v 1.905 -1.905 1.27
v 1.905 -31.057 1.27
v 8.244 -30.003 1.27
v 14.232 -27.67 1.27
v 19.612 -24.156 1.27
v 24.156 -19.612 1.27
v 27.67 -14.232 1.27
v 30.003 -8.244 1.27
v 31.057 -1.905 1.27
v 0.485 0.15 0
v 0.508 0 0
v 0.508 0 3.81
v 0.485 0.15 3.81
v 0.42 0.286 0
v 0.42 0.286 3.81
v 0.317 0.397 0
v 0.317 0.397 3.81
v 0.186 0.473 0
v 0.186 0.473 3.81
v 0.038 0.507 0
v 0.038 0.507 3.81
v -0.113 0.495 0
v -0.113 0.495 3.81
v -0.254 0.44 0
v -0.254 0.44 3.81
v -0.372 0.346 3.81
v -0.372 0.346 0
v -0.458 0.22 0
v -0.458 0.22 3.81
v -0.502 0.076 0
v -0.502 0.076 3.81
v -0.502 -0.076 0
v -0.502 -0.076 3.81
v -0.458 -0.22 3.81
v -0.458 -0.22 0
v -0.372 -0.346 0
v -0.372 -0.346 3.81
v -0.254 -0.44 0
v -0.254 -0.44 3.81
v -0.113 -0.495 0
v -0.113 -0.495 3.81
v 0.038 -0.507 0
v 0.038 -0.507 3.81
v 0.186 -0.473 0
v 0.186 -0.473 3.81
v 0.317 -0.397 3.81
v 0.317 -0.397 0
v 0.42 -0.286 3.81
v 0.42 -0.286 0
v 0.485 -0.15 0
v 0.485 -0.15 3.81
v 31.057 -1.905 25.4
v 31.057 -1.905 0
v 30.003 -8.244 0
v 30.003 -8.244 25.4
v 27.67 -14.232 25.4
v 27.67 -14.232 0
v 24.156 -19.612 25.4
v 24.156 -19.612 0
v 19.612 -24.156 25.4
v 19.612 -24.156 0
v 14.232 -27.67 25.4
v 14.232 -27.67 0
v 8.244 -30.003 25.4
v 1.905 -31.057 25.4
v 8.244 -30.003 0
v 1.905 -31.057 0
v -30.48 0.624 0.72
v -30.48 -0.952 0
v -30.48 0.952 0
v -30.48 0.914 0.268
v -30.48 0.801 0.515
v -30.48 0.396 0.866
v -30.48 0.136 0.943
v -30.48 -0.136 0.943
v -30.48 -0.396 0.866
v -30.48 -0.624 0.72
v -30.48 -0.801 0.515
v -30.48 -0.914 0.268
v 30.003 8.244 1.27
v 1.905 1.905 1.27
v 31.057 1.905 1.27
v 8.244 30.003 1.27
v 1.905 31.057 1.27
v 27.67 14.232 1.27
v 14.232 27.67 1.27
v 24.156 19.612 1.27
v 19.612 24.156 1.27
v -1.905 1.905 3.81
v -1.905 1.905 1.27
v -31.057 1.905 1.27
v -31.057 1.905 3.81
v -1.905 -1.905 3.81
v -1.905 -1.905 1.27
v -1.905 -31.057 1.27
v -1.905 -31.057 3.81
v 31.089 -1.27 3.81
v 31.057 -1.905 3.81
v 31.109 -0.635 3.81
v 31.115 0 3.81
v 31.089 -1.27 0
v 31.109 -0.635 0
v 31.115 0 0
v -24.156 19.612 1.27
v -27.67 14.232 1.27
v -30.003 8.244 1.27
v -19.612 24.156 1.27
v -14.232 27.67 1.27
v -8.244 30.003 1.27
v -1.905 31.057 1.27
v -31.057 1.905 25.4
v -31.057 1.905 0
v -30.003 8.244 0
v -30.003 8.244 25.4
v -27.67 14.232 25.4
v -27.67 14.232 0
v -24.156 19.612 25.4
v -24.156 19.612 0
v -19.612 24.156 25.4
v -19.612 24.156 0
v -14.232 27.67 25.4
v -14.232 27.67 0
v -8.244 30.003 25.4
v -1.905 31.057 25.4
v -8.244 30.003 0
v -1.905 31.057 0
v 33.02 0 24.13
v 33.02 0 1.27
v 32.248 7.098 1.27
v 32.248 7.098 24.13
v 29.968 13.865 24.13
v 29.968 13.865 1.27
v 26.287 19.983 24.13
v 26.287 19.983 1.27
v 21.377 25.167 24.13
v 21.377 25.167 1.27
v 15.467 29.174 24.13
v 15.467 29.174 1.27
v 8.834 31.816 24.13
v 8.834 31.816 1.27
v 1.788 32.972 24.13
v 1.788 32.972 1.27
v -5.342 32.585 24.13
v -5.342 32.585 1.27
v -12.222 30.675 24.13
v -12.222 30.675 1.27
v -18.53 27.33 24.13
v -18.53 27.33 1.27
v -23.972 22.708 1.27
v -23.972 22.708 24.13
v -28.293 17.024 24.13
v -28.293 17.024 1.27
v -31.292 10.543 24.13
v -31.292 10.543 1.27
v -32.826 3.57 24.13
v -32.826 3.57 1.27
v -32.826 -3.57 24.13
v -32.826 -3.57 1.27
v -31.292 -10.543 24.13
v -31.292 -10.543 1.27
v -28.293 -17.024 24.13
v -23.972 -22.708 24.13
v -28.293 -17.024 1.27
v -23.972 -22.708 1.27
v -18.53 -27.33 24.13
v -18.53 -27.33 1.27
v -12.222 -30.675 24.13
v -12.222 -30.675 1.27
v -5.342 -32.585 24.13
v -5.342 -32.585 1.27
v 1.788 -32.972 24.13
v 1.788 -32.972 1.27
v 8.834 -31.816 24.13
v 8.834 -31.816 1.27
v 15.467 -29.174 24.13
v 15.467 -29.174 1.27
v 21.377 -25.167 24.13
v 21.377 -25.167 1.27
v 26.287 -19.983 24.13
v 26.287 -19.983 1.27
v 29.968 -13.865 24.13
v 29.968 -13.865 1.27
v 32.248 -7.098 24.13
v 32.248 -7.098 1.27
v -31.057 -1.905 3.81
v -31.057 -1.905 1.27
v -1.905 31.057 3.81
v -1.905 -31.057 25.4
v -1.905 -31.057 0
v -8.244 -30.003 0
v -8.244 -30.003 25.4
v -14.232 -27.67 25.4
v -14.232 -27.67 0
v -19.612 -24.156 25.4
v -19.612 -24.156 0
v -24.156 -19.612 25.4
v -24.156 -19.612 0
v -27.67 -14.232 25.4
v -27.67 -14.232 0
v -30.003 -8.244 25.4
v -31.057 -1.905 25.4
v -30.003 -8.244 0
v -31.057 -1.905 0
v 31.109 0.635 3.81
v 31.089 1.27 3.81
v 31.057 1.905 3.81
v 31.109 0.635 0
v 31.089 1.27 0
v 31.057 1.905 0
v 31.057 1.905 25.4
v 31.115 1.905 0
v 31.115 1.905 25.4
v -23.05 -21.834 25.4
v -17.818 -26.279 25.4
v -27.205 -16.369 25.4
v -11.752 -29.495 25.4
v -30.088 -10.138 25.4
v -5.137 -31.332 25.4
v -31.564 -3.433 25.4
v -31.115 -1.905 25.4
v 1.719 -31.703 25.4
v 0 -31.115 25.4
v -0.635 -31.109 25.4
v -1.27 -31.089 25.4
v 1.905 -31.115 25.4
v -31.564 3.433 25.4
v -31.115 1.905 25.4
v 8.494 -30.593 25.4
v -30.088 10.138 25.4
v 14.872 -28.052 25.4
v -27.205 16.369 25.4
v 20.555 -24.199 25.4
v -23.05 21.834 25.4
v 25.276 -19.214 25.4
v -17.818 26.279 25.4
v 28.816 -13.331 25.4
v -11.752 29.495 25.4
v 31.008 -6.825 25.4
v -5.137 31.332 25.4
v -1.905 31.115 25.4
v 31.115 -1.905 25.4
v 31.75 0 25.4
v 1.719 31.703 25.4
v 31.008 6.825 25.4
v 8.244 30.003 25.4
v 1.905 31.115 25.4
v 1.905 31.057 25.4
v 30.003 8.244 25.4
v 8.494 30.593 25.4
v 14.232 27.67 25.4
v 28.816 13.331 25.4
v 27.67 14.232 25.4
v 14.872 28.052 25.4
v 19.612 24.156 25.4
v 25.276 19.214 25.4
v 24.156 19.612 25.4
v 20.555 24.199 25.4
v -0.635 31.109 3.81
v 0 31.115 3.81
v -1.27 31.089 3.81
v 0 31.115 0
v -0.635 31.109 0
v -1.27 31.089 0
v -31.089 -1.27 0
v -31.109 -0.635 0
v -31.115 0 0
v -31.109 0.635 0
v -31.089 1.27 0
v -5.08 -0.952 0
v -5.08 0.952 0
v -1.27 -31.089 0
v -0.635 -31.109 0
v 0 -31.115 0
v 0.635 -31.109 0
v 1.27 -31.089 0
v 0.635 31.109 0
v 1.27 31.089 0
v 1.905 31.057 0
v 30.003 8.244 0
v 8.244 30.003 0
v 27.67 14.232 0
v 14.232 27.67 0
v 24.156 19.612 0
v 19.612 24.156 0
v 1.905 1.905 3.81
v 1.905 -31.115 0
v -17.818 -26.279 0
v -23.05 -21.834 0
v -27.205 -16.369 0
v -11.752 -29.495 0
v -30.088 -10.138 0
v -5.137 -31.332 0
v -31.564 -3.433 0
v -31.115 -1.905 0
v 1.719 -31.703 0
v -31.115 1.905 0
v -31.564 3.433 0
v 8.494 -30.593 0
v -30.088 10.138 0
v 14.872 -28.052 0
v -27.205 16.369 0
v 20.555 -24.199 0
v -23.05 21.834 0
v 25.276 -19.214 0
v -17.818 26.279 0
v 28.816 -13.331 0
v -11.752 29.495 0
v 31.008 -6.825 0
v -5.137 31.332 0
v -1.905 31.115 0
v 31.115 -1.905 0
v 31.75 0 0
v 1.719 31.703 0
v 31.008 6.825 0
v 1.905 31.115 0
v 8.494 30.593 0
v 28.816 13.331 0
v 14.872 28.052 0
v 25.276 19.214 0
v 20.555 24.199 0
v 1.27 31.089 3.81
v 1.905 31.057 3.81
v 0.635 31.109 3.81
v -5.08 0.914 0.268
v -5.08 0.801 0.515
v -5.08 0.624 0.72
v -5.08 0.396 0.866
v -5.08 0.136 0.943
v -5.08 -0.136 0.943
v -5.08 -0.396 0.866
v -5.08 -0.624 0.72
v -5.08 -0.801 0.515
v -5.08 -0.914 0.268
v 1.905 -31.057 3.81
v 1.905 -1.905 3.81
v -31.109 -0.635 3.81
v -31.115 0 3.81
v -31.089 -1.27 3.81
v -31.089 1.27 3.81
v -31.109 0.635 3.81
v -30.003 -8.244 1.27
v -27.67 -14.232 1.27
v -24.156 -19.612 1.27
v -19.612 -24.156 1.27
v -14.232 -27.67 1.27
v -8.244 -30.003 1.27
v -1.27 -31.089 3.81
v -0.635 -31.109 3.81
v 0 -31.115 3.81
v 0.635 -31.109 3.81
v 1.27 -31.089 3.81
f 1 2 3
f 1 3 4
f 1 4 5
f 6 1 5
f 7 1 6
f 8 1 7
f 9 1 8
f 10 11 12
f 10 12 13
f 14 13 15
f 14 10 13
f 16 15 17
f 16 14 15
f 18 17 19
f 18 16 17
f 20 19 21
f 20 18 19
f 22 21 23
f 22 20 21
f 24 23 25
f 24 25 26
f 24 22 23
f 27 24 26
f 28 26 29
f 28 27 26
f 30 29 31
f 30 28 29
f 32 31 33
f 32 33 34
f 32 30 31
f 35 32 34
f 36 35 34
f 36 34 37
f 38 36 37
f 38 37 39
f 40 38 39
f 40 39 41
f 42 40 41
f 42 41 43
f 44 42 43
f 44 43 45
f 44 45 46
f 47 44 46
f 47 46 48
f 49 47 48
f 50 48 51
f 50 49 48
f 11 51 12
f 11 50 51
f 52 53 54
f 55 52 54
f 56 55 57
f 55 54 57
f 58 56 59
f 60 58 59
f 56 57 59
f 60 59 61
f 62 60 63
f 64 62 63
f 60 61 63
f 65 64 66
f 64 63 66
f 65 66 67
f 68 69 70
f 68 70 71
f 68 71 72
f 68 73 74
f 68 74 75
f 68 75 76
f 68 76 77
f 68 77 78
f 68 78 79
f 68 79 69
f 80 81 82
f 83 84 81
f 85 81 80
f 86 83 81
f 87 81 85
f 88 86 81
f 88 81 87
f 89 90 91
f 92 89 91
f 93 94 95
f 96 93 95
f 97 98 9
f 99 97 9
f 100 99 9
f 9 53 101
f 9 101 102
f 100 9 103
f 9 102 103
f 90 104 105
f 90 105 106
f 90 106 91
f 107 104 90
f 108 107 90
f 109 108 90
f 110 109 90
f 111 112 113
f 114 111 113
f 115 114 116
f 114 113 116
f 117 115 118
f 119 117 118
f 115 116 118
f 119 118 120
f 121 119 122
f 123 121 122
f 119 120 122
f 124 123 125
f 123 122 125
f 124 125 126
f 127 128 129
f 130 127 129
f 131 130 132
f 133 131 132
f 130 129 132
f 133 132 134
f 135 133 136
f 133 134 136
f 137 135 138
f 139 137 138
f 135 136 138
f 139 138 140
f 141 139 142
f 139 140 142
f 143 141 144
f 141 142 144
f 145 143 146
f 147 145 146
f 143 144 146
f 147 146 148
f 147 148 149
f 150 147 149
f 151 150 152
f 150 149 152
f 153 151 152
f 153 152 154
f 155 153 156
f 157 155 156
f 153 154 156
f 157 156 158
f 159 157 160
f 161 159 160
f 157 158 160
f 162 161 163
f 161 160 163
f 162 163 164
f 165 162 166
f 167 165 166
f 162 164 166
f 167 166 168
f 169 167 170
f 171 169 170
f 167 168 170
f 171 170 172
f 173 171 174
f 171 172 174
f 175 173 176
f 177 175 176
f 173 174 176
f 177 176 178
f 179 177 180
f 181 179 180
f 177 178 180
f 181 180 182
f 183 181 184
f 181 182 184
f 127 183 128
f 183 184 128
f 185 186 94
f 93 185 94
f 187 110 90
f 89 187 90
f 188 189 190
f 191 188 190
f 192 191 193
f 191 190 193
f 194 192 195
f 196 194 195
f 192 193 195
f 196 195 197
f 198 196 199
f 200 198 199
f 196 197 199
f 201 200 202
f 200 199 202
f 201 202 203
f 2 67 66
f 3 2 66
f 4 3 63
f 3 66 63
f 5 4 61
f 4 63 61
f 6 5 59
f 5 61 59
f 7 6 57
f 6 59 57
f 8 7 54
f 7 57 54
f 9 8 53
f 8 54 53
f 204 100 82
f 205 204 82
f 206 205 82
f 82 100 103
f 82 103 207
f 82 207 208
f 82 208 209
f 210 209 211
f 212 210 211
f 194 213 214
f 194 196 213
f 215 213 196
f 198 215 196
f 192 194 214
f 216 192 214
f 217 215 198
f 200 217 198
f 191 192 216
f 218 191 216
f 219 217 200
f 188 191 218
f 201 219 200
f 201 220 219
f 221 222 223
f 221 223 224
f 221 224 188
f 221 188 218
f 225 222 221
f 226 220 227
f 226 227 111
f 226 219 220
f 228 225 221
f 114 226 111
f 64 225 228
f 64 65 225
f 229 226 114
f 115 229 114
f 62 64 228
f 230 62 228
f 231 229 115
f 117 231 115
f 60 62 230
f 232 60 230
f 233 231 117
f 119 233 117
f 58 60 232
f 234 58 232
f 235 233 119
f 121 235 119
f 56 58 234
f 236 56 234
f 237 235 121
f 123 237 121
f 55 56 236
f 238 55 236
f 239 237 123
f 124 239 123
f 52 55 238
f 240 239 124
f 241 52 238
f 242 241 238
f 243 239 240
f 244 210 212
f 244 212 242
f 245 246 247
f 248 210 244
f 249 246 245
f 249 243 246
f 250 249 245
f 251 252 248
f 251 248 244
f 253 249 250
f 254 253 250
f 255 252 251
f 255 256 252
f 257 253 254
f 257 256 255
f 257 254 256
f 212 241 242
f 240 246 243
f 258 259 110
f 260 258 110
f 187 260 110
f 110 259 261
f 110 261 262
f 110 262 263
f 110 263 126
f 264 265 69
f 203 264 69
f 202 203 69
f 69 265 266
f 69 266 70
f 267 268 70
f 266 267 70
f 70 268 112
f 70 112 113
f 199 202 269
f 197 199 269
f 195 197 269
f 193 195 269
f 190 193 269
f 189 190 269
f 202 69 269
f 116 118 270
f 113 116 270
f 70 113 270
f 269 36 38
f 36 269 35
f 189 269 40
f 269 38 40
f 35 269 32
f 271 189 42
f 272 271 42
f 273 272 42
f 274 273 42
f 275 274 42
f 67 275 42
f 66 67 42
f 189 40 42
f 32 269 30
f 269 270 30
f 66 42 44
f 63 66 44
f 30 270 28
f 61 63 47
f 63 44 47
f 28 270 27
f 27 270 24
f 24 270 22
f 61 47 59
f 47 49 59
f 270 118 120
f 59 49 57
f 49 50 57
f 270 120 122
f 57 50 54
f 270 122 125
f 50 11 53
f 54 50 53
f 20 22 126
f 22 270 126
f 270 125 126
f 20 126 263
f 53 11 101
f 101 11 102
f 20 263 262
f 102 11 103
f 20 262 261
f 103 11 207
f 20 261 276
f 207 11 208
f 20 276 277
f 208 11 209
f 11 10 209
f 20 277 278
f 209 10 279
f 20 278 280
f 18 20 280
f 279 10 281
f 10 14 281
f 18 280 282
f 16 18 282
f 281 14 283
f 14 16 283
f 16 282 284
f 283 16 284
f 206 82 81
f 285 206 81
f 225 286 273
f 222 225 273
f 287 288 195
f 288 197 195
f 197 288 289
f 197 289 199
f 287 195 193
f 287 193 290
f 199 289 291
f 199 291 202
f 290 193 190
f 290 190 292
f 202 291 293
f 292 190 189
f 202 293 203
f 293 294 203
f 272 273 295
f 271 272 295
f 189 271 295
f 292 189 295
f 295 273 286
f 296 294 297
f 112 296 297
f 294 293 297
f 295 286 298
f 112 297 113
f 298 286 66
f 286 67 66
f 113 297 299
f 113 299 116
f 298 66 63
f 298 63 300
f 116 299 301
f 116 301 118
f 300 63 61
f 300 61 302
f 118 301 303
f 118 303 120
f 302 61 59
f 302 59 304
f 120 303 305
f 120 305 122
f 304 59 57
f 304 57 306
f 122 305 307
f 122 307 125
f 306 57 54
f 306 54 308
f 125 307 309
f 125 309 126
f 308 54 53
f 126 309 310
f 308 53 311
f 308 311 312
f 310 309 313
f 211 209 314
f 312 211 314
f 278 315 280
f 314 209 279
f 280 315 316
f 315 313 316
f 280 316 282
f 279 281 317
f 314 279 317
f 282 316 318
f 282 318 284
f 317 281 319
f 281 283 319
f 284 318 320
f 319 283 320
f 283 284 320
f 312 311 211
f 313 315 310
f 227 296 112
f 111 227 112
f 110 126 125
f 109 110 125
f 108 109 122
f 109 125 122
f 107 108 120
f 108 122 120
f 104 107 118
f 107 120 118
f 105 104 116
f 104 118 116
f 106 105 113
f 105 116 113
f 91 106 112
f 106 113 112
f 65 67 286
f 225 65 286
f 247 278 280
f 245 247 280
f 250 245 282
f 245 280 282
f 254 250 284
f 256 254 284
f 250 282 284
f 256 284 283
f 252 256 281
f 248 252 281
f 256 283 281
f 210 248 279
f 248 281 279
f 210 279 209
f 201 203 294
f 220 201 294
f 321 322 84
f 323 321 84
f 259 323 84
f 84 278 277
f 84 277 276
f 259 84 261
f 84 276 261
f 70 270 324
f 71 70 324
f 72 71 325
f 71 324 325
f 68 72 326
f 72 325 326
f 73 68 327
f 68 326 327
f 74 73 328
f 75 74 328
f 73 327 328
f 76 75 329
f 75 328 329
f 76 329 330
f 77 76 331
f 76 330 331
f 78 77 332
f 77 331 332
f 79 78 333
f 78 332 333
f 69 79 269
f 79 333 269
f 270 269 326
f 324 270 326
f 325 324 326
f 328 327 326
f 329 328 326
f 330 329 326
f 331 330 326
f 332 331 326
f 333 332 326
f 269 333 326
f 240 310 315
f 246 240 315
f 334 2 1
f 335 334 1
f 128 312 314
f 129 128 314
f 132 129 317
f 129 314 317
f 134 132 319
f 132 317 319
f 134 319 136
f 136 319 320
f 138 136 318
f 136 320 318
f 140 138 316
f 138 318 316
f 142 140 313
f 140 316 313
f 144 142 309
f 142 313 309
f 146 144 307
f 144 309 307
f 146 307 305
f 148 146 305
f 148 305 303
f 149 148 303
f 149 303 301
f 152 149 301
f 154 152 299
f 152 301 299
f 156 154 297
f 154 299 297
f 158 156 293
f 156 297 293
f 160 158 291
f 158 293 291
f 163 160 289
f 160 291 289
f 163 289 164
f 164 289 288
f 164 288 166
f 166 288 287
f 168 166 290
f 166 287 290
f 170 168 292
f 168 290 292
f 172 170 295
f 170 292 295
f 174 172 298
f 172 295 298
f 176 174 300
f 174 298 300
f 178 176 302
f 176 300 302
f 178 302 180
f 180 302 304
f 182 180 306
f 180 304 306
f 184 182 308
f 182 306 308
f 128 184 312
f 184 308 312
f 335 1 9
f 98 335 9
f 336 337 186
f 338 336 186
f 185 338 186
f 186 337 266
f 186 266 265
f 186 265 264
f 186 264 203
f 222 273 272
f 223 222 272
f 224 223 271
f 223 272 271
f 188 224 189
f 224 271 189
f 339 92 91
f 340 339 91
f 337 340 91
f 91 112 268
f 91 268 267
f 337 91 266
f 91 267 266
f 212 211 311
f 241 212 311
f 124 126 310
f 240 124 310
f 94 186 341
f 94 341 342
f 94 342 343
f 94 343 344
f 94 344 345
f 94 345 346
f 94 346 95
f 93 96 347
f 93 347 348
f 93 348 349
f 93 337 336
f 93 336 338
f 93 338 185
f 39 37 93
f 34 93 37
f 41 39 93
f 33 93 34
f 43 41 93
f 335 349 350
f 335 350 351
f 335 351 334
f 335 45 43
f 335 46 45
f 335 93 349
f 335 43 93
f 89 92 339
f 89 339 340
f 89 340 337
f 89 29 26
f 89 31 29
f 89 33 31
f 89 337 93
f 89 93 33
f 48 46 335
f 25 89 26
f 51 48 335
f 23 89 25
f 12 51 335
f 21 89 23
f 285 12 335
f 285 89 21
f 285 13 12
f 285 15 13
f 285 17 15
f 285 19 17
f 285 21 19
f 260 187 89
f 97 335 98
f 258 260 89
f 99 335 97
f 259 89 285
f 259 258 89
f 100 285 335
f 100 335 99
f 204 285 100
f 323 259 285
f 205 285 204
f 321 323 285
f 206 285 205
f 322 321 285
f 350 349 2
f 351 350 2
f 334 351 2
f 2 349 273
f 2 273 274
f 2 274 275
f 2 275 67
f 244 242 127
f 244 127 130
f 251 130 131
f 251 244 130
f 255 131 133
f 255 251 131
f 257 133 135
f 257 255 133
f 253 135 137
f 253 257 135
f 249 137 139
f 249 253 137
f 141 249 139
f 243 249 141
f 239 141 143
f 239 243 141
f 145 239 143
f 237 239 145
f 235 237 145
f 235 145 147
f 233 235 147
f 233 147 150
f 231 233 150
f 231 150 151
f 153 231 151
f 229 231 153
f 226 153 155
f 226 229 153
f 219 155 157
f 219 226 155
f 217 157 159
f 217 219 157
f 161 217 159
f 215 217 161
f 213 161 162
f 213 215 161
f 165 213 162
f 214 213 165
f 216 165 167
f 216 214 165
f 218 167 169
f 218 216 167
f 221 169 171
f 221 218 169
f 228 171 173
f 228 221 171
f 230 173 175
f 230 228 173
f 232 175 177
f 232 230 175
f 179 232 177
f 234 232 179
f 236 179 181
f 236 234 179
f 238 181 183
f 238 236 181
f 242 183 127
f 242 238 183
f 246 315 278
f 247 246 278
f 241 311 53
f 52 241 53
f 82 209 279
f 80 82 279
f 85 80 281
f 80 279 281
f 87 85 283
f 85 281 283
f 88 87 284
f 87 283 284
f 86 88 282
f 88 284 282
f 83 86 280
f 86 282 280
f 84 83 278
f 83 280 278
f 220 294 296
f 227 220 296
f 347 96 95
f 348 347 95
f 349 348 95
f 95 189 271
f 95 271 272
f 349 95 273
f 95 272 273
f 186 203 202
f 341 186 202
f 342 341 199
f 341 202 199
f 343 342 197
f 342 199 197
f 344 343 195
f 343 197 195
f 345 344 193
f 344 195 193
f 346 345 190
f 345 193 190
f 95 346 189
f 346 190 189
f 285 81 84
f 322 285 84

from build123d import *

# Parameters (mm, degrees)
F0_W     = 3.81
F0_H     = 3.81
F0_R     = 0.508
F1_DEPTH = 3.81
F2_DEPTH = 1.27
F4_R     = 0.9525
F5_DEPTH = 25.4
F0_R_2   = 33.02
F6_DEPTH = 25.4
F7_SIZE  = 1.27


# Not quite as in the source:
# - a feature names something its author has since deleted; it is built from what else it names


with BuildPart() as f1:
    # F0 (on Top) → F1 (new body)
    with BuildSketch(Plane.XY):
        Rectangle(F0_W, F0_H)
        Circle(F0_R, mode=Mode.SUBTRACT)
        with BuildLine():
            ThreePointArc((31.056628922, -1.905), (31.1004038069, -0.9529470319), (31.115, 0))
            ThreePointArc((31.115, 0), (31.1004038069, 0.9529470319), (31.056628922, 1.905))
            Line((31.056628922, 1.905), (1.905, 1.905))
            Line((1.905, 1.905), (1.905, -1.905))
            Line((1.905, -1.905), (31.056628922, -1.905))
        make_face()
        with BuildLine():
            ThreePointArc((0, -31.115), (0.9529470319, -31.1004038069), (1.905, -31.056628922))
            Line((1.905, -31.056628922), (1.905, -1.905))
            Line((1.905, -1.905), (-1.905, -1.905))
            Line((-1.905, -1.905), (-1.905, -31.056628922))
            ThreePointArc((-1.905, -31.056628922), (-0.9529470319, -31.1004038069), (0, -31.115))
        make_face()
        with BuildLine():
            Line((-1.905, -1.905), (-1.905, 1.905))
            Line((-1.905, 1.905), (-31.056628922, 1.905))
            ThreePointArc((-31.056628922, 1.905), (-31.1004038069, 0.9529470319), (-31.115, 0))
            ThreePointArc((-31.115, 0), (-31.1004038069, -0.9529470319), (-31.056628922, -1.905))
            Line((-31.056628922, -1.905), (-1.905, -1.905))
        make_face()
        with BuildLine():
            Line((1.905, 1.905), (1.905, 31.056628922))
            ThreePointArc((1.905, 31.056628922), (0.9529470319, 31.1004038069), (0, 31.115))
            ThreePointArc((0, 31.115), (-0.9529470319, 31.1004038069), (-1.905, 31.056628922))
            Line((-1.905, 31.056628922), (-1.905, 1.905))
            Line((-1.905, 1.905), (1.905, 1.905))
        make_face()
    extrude(amount=F1_DEPTH)

    # F0 (on Top) → F2 (join)
    with BuildSketch(Plane.XY):
        with BuildLine():
            Line((1.905, 1.905), (1.905, 31.056628922))
            ThreePointArc((1.905, 31.056628922), (0.9529470319, 31.1004038069), (0, 31.115))
            ThreePointArc((0, 31.115), (-0.9529470319, 31.1004038069), (-1.905, 31.056628922))
            Line((-1.905, 31.056628922), (-1.905, 1.905))
            Line((-1.905, 1.905), (1.905, 1.905))
        make_face()
        with BuildLine():
            ThreePointArc((0, -31.115), (0.9529470319, -31.1004038069), (1.905, -31.056628922))
            Line((1.905, -31.056628922), (1.905, -1.905))
            Line((1.905, -1.905), (-1.905, -1.905))
            Line((-1.905, -1.905), (-1.905, -31.056628922))
            ThreePointArc((-1.905, -31.056628922), (-0.9529470319, -31.1004038069), (0, -31.115))
        make_face()
        with BuildLine():
            Line((-31.056628922, 1.905), (-1.905, 1.905))
            Line((-1.905, 1.905), (-1.905, 31.056628922))
            ThreePointArc((-1.905, 31.056628922), (-22.0016274966, 22.0016274966), (-31.056628922, 1.905))
        make_face()
        with BuildLine():
            Line((-1.905, -31.056628922), (-1.905, -1.905))
            Line((-1.905, -1.905), (-31.056628922, -1.905))
            ThreePointArc((-31.056628922, -1.905), (-22.0016274966, -22.0016274966), (-1.905, -31.056628922))
        make_face()
        with BuildLine():
            Line((1.905, 1.905), (31.056628922, 1.905))
            ThreePointArc((31.056628922, 1.905), (22.0016274966, 22.0016274966), (1.905, 31.056628922))
            Line((1.905, 31.056628922), (1.905, 1.905))
        make_face()
        with BuildLine():
            ThreePointArc((1.905, -31.056628922), (22.0016274966, -22.0016274966), (31.056628922, -1.905))
            Line((31.056628922, -1.905), (1.905, -1.905))
            Line((1.905, -1.905), (1.905, -31.056628922))
        make_face()
    extrude(amount=F2_DEPTH)

    # F4 (on offset) → F5 (cut)
    with BuildSketch(Plane.YZ.offset(-5.08)):
        Circle(F4_R)
    extrude(amount=-F5_DEPTH, mode=Mode.SUBTRACT)


with BuildPart() as f6:
    # F0 (on Top) → F6 (new body)
    with BuildSketch(Plane.XY):
        Circle(F0_R_2)
        with BuildLine():
            Line((31.115, 1.905), (31.115, 0))
            Line((31.115, 0), (31.115, -1.905))
            Line((31.115, -1.905), (31.056628922, -1.905))
            ThreePointArc((31.056628922, -1.905), (22.0016274966, -22.0016274966), (1.905, -31.056628922))
            Line((1.905, -31.056628922), (1.905, -31.115))
            Line((1.905, -31.115), (0, -31.115))
            ThreePointArc((0, -31.115), (-0.9529470319, -31.1004038069), (-1.905, -31.056628922))
            ThreePointArc((-1.905, -31.056628922), (-22.0016274966, -22.0016274966), (-31.056628922, -1.905))
            Line((-31.056628922, -1.905), (-31.115, -1.905))
            Line((-31.115, -1.905), (-31.115, 0))
            Line((-31.115, 0), (-31.115, 1.905))
            Line((-31.115, 1.905), (-31.056628922, 1.905))
            ThreePointArc((-31.056628922, 1.905), (-22.0016274966, 22.0016274966), (-1.905, 31.056628922))
            Line((-1.905, 31.056628922), (-1.905, 31.115))
            Line((-1.905, 31.115), (0, 31.115))
            Line((0, 31.115), (1.905, 31.115))
            Line((1.905, 31.115), (1.905, 31.056628922))
            ThreePointArc((1.905, 31.056628922), (22.0016274966, 22.0016274966), (31.056628922, 1.905))
            Line((31.056628922, 1.905), (31.115, 1.905))
        make_face(mode=Mode.SUBTRACT)
    extrude(amount=F6_DEPTH)

    # F7
    f7_edges = [f6.edges().sort_by_distance(p)[0] for p in [
        (-33.02, 0, 25.4),
        (-33.02, 0, 0),
    ]]
    chamfer(f7_edges, length=F7_SIZE)


solid = Compound([f1.part, f6.part])
